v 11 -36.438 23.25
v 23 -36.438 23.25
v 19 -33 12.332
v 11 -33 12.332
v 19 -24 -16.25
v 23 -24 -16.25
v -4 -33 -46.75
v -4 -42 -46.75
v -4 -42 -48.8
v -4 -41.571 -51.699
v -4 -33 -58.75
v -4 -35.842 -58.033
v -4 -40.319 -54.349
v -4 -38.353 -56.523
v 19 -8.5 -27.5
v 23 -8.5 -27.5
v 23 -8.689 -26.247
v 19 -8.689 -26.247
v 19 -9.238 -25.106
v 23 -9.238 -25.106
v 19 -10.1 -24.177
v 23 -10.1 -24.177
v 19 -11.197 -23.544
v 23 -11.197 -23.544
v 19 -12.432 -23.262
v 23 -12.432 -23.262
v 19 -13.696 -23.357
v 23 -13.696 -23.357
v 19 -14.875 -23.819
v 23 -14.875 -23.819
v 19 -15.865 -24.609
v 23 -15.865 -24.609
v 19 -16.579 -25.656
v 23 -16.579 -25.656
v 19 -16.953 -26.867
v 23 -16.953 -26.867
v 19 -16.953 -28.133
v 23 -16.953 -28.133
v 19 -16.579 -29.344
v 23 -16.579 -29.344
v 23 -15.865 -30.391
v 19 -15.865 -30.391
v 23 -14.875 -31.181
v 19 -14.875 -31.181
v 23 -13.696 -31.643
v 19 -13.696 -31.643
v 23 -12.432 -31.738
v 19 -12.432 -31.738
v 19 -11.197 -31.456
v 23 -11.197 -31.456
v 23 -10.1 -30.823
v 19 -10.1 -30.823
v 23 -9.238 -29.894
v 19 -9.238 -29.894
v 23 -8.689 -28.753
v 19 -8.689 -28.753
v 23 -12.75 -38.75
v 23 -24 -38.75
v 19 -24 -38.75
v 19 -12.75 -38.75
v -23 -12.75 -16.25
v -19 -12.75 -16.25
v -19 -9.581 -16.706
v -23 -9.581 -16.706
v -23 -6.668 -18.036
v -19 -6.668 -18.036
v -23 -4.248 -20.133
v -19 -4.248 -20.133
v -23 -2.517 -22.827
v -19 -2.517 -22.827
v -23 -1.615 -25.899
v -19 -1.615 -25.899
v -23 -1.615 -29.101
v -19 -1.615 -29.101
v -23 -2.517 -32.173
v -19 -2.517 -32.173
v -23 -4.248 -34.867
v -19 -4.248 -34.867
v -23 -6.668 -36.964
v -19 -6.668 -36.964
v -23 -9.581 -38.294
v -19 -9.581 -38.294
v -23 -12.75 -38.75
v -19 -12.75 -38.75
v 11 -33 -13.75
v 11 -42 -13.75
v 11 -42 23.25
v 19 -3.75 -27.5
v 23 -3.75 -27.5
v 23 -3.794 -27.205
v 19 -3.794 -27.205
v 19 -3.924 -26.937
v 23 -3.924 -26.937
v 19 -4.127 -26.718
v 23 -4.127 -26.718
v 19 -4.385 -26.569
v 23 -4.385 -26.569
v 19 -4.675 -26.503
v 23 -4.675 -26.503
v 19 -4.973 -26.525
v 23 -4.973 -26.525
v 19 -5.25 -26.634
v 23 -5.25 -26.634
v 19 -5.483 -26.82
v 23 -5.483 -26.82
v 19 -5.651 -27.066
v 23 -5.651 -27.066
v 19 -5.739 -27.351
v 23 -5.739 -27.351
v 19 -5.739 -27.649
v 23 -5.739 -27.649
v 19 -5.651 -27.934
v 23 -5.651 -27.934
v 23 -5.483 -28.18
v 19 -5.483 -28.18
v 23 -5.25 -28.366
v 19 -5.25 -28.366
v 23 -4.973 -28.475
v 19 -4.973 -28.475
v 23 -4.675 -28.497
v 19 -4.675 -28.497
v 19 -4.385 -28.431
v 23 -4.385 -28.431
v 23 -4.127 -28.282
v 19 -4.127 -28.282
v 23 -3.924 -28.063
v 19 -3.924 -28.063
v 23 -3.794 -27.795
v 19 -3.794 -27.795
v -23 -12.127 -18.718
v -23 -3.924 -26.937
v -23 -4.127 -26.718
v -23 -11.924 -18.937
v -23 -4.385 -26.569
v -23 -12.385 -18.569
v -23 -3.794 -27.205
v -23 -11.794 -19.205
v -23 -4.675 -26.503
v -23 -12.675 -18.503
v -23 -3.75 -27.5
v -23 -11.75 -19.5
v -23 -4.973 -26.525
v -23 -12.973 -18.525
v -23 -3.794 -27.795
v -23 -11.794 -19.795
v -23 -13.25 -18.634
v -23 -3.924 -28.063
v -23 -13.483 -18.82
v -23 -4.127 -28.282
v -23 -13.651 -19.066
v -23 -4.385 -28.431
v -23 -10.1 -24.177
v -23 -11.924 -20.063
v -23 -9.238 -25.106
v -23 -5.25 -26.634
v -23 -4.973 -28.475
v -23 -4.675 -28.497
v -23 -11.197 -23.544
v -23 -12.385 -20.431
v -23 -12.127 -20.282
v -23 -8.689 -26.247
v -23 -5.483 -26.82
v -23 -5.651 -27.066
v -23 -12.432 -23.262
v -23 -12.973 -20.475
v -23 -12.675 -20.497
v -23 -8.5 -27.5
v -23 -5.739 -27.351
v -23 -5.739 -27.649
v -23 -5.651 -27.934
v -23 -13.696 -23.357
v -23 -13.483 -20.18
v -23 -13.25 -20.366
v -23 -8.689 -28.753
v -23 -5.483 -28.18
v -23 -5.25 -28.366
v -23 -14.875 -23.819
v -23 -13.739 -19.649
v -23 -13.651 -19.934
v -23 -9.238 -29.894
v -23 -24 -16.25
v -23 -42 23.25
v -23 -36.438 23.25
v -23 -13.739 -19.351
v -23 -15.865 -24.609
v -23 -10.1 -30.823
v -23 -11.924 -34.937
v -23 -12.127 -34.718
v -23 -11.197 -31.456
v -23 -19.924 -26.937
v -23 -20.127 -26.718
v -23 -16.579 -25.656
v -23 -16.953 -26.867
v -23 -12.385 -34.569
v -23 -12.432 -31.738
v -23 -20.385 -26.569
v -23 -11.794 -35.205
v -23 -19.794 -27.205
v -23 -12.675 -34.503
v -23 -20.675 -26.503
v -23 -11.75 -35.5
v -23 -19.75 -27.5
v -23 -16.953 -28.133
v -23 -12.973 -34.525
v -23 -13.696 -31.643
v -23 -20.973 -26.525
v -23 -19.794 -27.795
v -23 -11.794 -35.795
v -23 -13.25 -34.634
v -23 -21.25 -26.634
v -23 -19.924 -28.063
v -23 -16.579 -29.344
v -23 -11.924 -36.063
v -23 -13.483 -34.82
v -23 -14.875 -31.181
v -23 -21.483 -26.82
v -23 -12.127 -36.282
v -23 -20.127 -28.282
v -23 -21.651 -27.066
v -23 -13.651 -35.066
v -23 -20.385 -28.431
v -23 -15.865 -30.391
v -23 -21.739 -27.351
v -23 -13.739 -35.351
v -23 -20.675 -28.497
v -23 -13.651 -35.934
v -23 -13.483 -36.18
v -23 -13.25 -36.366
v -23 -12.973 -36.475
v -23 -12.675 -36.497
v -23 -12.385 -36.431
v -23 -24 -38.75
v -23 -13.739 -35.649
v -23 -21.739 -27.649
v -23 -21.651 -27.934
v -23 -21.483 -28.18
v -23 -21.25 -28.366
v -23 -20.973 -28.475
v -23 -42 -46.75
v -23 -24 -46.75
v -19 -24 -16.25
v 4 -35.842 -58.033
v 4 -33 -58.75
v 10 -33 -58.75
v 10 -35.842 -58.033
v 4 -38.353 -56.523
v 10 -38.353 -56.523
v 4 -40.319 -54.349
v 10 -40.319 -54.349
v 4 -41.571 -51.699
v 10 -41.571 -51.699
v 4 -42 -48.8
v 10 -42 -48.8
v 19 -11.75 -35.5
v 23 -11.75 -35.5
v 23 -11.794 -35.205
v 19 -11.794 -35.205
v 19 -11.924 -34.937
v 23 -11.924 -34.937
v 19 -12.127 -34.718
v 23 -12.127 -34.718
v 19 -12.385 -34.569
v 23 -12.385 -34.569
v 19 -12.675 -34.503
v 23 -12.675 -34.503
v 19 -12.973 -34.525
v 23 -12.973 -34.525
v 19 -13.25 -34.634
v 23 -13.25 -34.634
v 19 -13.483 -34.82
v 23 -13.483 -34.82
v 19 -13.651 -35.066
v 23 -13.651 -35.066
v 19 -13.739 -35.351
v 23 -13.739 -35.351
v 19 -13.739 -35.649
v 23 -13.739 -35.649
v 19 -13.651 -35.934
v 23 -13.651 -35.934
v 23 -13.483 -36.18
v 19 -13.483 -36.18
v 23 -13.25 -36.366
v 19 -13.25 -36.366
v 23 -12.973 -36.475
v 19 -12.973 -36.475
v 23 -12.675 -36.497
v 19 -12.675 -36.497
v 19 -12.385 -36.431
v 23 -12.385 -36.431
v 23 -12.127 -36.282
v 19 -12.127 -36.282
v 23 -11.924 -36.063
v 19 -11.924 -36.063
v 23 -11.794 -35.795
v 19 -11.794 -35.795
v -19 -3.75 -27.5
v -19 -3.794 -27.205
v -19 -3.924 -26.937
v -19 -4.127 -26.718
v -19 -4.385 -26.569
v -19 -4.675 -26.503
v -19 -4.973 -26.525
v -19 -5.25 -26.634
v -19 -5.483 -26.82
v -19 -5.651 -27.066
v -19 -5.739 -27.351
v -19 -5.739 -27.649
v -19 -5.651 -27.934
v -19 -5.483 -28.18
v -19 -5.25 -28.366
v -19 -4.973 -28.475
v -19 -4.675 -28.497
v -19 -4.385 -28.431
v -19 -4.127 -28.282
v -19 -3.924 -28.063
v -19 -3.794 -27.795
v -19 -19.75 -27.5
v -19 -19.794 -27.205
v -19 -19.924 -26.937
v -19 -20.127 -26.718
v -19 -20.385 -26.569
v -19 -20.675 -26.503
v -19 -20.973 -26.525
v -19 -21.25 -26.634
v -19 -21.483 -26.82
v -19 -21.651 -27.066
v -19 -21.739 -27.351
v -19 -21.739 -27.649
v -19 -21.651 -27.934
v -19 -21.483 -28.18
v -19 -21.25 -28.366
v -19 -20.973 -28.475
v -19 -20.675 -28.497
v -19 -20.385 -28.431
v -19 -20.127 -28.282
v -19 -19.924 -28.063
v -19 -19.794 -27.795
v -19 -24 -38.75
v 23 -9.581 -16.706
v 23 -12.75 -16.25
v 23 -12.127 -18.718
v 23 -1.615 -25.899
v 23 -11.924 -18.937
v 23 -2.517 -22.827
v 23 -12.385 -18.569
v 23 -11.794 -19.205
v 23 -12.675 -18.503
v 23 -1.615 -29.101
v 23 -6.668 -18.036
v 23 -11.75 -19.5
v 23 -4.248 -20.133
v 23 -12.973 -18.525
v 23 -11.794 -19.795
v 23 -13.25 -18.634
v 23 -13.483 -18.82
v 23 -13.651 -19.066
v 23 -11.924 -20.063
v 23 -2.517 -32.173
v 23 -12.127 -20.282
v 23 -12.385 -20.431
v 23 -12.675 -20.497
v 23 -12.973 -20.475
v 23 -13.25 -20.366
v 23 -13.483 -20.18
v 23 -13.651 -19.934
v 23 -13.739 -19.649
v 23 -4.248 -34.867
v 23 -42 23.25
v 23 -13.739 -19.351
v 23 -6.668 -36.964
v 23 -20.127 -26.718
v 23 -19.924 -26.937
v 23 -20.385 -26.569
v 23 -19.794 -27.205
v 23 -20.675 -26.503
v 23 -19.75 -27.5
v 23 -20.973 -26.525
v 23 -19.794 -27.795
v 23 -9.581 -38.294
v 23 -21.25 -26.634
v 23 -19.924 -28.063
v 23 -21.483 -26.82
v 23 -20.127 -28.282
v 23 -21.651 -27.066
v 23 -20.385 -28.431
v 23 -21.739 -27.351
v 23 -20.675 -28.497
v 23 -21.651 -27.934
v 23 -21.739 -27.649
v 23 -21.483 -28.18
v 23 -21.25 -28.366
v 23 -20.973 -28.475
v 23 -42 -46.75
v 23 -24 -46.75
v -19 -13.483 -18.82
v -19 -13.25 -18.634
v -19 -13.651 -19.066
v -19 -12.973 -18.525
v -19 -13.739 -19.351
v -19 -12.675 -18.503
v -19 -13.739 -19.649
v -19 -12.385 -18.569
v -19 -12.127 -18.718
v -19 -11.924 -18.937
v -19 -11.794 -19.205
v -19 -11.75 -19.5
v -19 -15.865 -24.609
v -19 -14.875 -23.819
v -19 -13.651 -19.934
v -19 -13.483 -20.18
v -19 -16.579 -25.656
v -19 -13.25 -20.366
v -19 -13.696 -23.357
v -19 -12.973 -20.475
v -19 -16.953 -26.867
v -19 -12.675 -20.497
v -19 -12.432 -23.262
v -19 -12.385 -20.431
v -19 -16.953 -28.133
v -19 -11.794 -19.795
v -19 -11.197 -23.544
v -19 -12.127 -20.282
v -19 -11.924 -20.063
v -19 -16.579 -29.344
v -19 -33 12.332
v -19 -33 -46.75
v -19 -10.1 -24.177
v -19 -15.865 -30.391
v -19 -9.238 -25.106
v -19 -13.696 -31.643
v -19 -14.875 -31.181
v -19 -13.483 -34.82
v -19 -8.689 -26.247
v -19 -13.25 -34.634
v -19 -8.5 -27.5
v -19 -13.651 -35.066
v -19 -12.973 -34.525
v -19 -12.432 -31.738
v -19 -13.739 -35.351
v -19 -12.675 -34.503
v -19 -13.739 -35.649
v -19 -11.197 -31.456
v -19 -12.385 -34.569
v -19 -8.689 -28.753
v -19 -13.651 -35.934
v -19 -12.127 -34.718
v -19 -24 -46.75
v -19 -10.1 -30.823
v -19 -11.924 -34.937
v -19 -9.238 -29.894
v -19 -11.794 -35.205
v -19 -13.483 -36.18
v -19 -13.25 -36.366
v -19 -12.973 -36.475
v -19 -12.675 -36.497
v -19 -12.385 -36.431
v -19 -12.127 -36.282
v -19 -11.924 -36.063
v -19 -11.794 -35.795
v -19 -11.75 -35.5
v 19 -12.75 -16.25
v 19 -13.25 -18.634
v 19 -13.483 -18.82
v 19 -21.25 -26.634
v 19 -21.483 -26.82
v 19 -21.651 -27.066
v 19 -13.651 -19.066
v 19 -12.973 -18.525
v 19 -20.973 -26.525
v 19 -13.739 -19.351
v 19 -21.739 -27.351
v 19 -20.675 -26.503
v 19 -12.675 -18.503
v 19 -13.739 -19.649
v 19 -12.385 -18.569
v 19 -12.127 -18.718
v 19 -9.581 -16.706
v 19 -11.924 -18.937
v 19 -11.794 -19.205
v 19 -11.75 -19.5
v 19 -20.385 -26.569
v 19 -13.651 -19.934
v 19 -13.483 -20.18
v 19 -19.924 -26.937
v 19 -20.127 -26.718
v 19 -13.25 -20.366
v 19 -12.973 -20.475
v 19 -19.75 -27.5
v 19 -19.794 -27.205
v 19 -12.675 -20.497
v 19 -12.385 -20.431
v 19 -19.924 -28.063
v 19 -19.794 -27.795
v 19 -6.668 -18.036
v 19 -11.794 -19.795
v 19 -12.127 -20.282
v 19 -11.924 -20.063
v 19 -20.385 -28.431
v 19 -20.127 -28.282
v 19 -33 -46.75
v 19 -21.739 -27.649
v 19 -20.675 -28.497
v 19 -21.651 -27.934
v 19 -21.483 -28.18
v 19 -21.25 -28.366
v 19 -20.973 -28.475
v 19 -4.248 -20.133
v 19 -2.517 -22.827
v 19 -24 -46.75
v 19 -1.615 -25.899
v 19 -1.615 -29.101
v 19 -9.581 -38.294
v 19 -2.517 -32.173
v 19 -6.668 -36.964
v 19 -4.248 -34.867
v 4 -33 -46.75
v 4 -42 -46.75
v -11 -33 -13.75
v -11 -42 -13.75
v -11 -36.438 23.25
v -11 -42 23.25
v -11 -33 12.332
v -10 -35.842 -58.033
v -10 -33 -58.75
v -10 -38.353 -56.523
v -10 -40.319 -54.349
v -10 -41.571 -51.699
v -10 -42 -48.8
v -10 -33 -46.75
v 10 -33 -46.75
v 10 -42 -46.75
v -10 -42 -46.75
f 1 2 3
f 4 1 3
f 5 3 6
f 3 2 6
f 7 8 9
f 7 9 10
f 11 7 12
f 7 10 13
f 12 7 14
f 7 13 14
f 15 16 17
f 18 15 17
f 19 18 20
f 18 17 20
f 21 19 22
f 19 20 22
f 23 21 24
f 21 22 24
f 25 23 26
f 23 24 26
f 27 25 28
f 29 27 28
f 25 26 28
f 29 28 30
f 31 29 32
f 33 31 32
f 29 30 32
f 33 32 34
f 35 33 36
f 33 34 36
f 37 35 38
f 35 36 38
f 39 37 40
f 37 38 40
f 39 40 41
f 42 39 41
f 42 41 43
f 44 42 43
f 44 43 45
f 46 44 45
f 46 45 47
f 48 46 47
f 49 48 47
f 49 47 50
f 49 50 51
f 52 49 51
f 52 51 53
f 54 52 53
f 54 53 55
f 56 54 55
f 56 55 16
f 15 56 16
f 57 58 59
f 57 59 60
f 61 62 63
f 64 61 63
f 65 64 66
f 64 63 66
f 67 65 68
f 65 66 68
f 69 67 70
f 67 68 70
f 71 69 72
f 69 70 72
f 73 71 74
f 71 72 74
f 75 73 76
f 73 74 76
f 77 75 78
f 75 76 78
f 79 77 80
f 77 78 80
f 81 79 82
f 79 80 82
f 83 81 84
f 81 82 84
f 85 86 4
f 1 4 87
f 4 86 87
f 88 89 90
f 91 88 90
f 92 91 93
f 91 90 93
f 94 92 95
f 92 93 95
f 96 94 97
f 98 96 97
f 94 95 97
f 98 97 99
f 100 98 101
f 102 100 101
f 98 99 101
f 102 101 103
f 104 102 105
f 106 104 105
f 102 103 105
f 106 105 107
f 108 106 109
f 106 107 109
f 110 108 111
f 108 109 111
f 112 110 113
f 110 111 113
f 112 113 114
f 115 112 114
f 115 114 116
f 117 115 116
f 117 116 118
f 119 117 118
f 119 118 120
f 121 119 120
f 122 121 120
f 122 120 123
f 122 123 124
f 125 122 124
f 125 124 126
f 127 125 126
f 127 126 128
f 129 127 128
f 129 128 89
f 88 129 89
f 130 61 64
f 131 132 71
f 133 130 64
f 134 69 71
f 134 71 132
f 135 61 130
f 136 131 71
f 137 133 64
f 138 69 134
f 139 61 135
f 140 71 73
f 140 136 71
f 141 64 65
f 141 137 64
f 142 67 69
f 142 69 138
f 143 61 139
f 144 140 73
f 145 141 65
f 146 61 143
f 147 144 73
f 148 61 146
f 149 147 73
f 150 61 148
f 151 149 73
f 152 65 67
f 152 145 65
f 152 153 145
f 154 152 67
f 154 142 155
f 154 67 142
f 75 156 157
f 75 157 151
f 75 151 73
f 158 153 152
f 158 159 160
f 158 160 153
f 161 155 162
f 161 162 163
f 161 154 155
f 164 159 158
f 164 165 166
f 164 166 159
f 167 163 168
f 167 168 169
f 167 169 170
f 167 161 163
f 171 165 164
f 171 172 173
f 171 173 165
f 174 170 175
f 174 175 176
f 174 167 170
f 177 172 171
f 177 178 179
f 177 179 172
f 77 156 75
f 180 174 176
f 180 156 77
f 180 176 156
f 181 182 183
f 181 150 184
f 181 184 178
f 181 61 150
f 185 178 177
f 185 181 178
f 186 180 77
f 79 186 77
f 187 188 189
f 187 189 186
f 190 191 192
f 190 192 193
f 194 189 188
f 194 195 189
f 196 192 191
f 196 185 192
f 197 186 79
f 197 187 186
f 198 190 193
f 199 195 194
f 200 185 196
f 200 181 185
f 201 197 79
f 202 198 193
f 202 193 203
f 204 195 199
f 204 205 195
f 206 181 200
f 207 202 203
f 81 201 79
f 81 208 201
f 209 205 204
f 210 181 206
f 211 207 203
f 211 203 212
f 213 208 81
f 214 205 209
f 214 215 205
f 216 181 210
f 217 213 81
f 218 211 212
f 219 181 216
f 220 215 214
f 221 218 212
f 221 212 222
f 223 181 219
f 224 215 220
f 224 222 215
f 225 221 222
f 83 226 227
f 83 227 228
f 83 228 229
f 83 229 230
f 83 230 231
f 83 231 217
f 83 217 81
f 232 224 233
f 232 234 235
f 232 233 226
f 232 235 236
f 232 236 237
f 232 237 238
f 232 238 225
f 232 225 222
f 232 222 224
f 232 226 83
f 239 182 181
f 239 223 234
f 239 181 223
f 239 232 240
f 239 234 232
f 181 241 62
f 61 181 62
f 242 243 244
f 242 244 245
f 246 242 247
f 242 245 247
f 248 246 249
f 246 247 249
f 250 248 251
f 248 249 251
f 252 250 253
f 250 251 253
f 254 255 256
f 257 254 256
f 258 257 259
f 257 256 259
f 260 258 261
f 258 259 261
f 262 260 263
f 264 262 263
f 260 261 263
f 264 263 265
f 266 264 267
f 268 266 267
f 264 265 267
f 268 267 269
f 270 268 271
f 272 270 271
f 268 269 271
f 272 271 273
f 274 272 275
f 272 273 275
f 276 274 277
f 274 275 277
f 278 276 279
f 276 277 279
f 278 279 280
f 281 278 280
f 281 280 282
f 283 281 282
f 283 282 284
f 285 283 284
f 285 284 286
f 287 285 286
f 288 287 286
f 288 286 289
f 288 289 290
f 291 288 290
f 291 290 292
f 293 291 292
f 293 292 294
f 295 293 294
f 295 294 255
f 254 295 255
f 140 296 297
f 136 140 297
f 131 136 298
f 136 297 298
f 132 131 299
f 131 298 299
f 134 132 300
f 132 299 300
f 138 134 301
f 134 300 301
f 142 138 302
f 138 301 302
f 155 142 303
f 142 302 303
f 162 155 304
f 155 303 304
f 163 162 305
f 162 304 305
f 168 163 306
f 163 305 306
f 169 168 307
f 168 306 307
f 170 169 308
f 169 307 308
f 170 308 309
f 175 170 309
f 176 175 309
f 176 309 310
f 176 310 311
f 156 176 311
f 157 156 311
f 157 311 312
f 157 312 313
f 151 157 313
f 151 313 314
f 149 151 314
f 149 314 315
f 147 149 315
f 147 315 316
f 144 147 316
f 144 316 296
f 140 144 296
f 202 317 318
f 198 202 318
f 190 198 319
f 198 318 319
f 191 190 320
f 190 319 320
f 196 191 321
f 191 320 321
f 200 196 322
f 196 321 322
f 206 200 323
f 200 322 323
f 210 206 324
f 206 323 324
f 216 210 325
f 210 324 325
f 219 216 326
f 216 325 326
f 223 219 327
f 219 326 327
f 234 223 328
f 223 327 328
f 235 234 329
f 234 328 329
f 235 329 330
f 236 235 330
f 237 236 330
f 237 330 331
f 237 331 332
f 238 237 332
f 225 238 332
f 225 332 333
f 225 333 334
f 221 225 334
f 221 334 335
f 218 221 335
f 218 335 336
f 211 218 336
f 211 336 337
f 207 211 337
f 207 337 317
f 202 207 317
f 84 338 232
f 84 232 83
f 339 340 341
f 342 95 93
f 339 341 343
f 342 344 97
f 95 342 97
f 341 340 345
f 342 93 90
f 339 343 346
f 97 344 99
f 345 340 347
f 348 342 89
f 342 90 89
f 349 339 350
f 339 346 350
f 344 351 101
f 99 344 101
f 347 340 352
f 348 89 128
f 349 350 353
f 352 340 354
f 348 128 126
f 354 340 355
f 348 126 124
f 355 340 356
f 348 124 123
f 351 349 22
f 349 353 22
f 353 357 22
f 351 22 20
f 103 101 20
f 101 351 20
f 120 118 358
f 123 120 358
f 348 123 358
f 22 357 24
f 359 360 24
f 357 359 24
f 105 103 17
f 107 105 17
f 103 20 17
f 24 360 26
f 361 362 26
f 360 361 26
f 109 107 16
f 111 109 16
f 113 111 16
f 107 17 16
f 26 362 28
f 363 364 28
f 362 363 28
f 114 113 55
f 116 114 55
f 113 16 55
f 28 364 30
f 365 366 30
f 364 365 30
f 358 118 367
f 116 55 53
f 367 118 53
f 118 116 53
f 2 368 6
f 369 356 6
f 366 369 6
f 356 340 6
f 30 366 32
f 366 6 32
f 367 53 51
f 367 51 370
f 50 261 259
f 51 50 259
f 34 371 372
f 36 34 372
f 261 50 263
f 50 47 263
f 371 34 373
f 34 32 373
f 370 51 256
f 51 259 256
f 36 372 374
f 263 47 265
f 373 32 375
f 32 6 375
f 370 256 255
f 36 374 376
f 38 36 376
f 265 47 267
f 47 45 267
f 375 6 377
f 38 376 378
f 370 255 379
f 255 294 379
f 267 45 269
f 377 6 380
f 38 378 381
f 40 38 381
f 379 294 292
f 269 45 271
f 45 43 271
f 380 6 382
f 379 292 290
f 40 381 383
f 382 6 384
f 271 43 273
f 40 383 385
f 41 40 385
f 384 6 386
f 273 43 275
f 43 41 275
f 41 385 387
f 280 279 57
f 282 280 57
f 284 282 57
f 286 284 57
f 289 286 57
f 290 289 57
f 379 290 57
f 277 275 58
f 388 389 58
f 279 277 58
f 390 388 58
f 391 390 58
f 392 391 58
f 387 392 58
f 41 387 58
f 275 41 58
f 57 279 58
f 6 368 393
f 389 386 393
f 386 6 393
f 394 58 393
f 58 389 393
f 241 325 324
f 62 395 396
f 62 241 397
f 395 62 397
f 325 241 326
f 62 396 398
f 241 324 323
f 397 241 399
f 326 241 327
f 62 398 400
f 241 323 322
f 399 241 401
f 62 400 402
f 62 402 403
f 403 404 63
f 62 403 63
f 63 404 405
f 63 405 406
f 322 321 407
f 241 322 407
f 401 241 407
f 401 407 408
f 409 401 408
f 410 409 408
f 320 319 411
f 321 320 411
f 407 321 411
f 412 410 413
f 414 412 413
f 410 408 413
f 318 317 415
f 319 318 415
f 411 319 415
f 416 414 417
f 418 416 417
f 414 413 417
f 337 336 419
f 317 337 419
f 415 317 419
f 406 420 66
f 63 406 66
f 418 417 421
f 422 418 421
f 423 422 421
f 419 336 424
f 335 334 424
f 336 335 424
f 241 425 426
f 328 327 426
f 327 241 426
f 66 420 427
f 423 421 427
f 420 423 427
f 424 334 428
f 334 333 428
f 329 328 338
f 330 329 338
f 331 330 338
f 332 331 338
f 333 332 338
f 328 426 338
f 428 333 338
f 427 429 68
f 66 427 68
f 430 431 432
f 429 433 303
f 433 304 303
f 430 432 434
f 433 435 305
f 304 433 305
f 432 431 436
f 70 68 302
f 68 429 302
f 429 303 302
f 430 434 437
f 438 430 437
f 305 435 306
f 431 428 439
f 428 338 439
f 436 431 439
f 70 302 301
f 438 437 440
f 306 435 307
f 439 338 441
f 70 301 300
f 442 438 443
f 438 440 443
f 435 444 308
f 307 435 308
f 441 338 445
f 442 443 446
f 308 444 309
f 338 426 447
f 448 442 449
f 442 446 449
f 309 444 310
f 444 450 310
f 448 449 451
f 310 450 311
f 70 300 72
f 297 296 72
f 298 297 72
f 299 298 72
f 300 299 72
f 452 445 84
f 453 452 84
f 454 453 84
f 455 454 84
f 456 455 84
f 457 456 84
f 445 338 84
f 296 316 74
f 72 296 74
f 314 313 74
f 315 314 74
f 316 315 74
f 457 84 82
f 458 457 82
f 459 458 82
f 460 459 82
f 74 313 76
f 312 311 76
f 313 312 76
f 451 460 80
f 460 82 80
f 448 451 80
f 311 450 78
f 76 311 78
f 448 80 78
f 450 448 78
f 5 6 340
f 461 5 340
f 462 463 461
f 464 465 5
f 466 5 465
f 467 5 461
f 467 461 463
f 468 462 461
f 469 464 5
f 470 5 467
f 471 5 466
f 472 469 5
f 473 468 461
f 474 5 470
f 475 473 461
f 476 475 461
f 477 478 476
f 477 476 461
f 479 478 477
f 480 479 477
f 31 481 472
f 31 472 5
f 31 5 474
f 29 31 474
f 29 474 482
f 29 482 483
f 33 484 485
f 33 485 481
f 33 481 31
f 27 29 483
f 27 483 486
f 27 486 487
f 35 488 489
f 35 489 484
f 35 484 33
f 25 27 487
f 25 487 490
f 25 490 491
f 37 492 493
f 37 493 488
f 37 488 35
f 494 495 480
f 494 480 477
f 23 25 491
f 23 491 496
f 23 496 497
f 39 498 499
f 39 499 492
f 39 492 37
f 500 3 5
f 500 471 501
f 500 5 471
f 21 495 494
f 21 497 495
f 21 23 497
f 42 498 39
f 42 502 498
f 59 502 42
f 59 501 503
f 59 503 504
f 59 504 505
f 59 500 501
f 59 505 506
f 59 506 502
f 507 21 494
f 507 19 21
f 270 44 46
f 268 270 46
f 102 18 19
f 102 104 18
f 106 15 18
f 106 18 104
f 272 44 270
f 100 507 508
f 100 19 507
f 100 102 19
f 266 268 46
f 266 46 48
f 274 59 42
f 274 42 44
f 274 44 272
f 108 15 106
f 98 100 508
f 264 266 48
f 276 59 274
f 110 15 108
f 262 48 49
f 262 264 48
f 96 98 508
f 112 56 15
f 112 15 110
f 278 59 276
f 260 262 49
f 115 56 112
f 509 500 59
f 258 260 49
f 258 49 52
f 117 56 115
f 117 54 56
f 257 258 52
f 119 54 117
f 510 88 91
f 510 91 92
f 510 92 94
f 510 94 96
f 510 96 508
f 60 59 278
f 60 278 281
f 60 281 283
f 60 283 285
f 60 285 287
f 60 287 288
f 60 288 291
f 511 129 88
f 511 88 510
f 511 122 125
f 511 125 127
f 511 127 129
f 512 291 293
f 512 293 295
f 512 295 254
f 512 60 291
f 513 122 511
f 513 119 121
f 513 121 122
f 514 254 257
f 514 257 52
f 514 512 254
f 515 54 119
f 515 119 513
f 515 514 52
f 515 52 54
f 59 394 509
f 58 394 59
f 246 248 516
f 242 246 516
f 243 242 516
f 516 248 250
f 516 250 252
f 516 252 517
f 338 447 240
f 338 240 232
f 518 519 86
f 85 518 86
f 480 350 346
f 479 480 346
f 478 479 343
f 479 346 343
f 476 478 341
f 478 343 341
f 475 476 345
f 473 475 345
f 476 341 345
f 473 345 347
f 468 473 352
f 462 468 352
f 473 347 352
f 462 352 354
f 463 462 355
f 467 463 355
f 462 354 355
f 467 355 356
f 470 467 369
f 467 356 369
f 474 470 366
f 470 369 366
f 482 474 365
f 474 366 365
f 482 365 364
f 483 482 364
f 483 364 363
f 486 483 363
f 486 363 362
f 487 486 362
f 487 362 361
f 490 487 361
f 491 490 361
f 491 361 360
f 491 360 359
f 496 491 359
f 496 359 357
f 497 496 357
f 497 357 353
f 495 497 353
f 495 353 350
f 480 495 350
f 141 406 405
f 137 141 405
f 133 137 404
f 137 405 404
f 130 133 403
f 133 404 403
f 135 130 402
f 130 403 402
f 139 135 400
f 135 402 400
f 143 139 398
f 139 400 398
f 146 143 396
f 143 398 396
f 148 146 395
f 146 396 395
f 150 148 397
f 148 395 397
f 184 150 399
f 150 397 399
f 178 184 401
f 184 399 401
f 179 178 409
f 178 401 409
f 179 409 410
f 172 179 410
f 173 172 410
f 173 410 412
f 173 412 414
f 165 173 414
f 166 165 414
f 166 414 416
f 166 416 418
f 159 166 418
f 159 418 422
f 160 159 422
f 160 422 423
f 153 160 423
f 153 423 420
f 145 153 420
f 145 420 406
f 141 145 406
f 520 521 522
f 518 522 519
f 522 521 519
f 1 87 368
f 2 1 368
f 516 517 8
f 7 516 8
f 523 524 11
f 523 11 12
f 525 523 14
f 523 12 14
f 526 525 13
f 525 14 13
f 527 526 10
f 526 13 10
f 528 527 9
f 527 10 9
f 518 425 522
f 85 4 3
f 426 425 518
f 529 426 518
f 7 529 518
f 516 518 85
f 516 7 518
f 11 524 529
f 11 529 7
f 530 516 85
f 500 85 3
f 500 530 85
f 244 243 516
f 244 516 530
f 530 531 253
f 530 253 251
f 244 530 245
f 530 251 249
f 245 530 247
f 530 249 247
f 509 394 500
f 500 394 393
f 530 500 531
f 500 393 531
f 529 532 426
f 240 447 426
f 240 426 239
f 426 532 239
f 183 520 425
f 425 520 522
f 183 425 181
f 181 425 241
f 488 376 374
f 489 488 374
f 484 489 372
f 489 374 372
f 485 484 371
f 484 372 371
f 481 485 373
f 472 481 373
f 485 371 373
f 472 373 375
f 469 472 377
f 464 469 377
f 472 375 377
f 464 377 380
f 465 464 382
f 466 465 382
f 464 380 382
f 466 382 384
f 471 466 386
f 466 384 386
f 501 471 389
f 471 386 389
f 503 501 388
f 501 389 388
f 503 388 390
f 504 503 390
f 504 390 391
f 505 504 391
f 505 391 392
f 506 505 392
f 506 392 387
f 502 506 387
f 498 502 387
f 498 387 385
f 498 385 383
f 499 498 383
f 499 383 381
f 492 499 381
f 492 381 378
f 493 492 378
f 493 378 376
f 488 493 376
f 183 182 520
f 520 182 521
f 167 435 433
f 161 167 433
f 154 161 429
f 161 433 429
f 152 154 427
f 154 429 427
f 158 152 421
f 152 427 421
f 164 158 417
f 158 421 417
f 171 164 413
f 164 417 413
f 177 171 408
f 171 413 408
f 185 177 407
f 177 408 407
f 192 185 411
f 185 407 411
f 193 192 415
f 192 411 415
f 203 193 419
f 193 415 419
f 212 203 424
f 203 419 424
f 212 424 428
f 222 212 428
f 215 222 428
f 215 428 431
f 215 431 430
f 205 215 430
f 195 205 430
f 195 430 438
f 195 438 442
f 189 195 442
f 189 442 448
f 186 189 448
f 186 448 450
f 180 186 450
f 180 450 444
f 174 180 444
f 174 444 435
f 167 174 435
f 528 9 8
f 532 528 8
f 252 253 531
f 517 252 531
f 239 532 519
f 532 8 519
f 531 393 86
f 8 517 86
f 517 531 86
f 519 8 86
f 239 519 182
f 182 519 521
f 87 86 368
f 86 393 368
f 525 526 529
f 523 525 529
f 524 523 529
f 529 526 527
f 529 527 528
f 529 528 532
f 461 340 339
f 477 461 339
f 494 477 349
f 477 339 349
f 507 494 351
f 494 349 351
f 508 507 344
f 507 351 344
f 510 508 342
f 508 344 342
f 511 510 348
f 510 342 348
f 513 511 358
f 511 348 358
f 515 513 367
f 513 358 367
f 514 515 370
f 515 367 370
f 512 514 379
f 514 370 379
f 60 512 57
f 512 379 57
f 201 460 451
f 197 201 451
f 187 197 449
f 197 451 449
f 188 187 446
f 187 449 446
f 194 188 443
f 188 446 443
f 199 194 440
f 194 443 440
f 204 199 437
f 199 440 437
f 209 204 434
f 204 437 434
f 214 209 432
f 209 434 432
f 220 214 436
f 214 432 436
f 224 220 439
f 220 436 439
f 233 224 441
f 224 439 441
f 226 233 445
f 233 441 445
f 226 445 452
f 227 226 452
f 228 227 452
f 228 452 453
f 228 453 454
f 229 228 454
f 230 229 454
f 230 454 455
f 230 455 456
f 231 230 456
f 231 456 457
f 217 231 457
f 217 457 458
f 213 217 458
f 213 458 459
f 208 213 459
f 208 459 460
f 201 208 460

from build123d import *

# Parameters (mm, degrees)
SKETCH1_W                = 50
SKETCH1_H                = 170
BOSS_EXTRUDE1_DEPTH      = 55
SKETCH2_W                = 34
SKETCH2_H                = 27
CUT_EXTRUDE1_DEPTH       = 181.416185527
SKETCH3_W                = 10
SKETCH3_H                = 24
SKETCH3_R                = 4.25
SKETCH3_R_2              = 1
CUT_EXTRUDE2_DEPTH       = 186.539753153
SKETCH4_W                = 2
SKETCH4_H                = 24
CUT_EXTRUDE3_DEPTH       = 178.623196683
SKETCH5_W                = 6.25
SKETCH5_H                = 11.25
CUT_EXTRUDE4_DEPTH       = 186.539753153
SKETCH6_W                = 38
SKETCH6_H                = 10
CUT_EXTRUDE5_DEPTH       = 181.416185527
SKETCH8_W                = 13.25
SKETCH8_H                = 2.25
CUT_EXTRUDE7_DEPTH       = 186.539753153
SKETCH9_W                = 34
SKETCH9_H                = 35.25
CUT_EXTRUDE8_DEPTH       = 179.297679458
SKETCH11_W               = 13.25
SKETCH11_H               = 20.25
CUT_EXTRUDE9_DEPTH       = 184.480414486
SKETCH12_W               = 28.5
SKETCH12_H               = 15
BOSS_EXTRUDE2_DEPTH      = 8
SKETCH14_W               = 34
SKETCH14_H               = 15
SKETCH14_H_2             = 10.25
BOSS_EXTRUDE3_DEPTH      = 13.25
SKETCH16_R               = 4.5
SKETCH16_R_2             = 2.5
CUT_EXTRUDE13_DEPTH      = 8
SKETCH17_R               = 4.5
SKETCH17_W               = 55
SKETCH17_H               = 10.25
CUT_EXTRUDE15_DEPTH      = 175.384811552
SKETCH18_W               = 71.25
SKETCH18_H               = 27.5
SKETCH18_W_2             = 13.75
SKETCH18_W_3             = 16.25
BOSS_EXTRUDE4_DEPTH      = 50
SKETCH19_W               = 38
SKETCH19_H               = 7
CUT_EXTRUDE16_DEPTH      = 152.25227271
SKETCH20_W               = 57.5
SKETCH20_H               = 27.5
CUT_EXTRUDE17_DEPTH      = 102.137591923
CUT_EXTRUDE18_DEPTH      = 100.39221549
SKETCH22_W               = 82.5
SKETCH22_H               = 2.5
BOSS_EXTRUDE5_DEPTH      = 50
SKETCH24_W               = 22
SKETCH24_H               = 17
CUT_EXTRUDE19_DEPTH      = 101.710289941
SKETCH25_W               = 38
SKETCH25_H               = 38.136363636
CUT_EXTRUDE20_DEPTH      = 10
SKETCH27_W               = 38
SKETCH27_H               = 60.136363636
BOSS_EXTRUDE6_DEPTH      = 8.6
SKETCH29_W               = 38
SKETCH29_H               = 1.4
CUT_EXTRUDE21_DEPTH      = 85.601313414
BOSS_EXTRUDE7_DEPTH      = 50
SKETCH31_W               = 38
SKETCH31_H               = 17
CUT_EXTRUDE22_DEPTH      = 117.365802537
SKETCH32_W               = 100
SKETCH32_H               = 3
CUT_EXTRUDE23_DEPTH      = 101.710289941
SKETCH33_W               = 20
SKETCH33_H               = 10
SKETCH33_W_2             = 22
SKETCH33_H_2             = 45
CUT_EXTRUDE24_DEPTH      = 84.137311118
SKETCH34_W               = 8
SKETCH34_H               = 12
CUT_EXTRUDE25_DEPTH      = 76.0787087
BOSS_EXTRUDE8_DEPTH      = 8
SKETCH37_W               = 78
SKETCH37_H               = 9
SKETCH37_W_2             = 12
CUT_EXTRUDE27_DEPTH      = 93.48006542
FILLET1_R                = 10
CUT_EXTRUDE29_DEPTH      = 77.423572934
CUT_EXTRUDE29_DEPTH_BACK = 77.423572934
SKETCH38_W               = 2
SKETCH38_H               = 78
SKETCH38_W_2             = 46
SKETCH38_H_2             = 8


with BuildPart() as part:
    # Sketch1 → Boss-Extrude1 (new body)
    with BuildSketch(Plane.XY):
        with Locations((0, -85)):
            Rectangle(SKETCH1_W, SKETCH1_H)
    extrude(amount=-BOSS_EXTRUDE1_DEPTH)

    # Sketch2 → Cut-Extrude1 (cut, through all)
    with BuildSketch(Plane.XY):
        with Locations((0, -13.5)):
            Rectangle(SKETCH2_W, SKETCH2_H)
    extrude(amount=-CUT_EXTRUDE1_DEPTH, mode=Mode.SUBTRACT)

    # Sketch3 → Cut-Extrude2 (cut, through all)
    with BuildSketch(Plane(origin=(25, 0, 0), x_dir=(0, 0, -1), z_dir=(1, 0, 0))):
        with Locations((50, -12)):
            Rectangle(SKETCH3_W, SKETCH3_H)
        with Locations((5, -12)):
            Rectangle(SKETCH3_W, SKETCH3_H)
        with Locations(Location((27.5, -12.75, 0), (0, 0, 90))):
            Circle(SKETCH3_R)
        with Locations(Location((35.5, -12.75, 0), (0, 0, 90))):
            Circle(SKETCH3_R_2)
        with Locations(Location((27.5, -4.75, 0), (0, 0, 90))):
            Circle(SKETCH3_R_2)
        with Locations(Location((27.5, -20.75, 0), (0, 0, 90))):
            Circle(SKETCH3_R_2)
        with Locations(Location((19.5, -12.75, 0), (0, 0, 90))):
            Circle(SKETCH3_R_2)
    extrude(amount=-CUT_EXTRUDE2_DEPTH, mode=Mode.SUBTRACT)

    # Sketch4 → Cut-Extrude3 (cut, through all)
    with BuildSketch(Plane.XY.offset(-10)):
        with Locations((-18, -12)):
            Rectangle(SKETCH4_W, SKETCH4_H)
        with Locations((18, -12)):
            Rectangle(SKETCH4_W, SKETCH4_H)
    extrude(amount=-CUT_EXTRUDE3_DEPTH, mode=Mode.SUBTRACT)

    # Sketch5 → Cut-Extrude4 (cut, through all)
    with BuildSketch(Plane(origin=(25, 0, 0), x_dir=(0, 0, -1), z_dir=(1, 0, 0))):
        with BuildLine():
            Line((45, 0), (10, 0))
            Line((10, 0), (10, -12.75))
            Line((10, -12.75), (16.25, -12.75))
            ThreePointArc((16.25, -12.75), (27.5, -1.5), (38.75, -12.75))
            Line((38.75, -12.75), (45, -12.75))
            Line((45, -12.75), (45, 0))
        make_face()
        with Locations((13.125, -18.375)):
            Rectangle(SKETCH5_W, SKETCH5_H)
        with Locations((41.875, -18.375)):
            Rectangle(SKETCH5_W, SKETCH5_H)
    extrude(amount=-CUT_EXTRUDE4_DEPTH, mode=Mode.SUBTRACT)

    # Sketch6 → Cut-Extrude5 (cut, through all)
    with BuildSketch(Plane.XY):
        with Locations((0, -29)):
            Rectangle(SKETCH6_W, SKETCH6_H)
    extrude(amount=-CUT_EXTRUDE5_DEPTH, mode=Mode.SUBTRACT)

    # Sketch8 → Cut-Extrude7 (cut, through all)
    with BuildSketch(Plane(origin=(25, 0, 0), x_dir=(0, 0, -1), z_dir=(1, 0, 0))):
        with BuildLine():
            Line((27.5, -157.5), (27.5, -132.5))
            Line((27.5, -132.5), (13.25, -132.5))
            Line((13.25, -132.5), (13.25, -167.75))
            Line((13.25, -167.75), (17.25, -167.75))
            ThreePointArc((17.25, -167.75), (20.252155493, -160.502155493), (27.5, -157.5))
        make_face()
        with BuildLine():
            Line((41.75, -167.75), (41.75, -132.5))
            Line((41.75, -132.5), (27.5, -132.5))
            Line((27.5, -132.5), (27.5, -157.5))
            ThreePointArc((27.5, -157.5), (34.747844507, -160.502155493), (37.75, -167.75))
            Line((37.75, -167.75), (41.75, -167.75))
        make_face()
        with Locations((48.375, -168.875)):
            Rectangle(SKETCH8_W, SKETCH8_H)
        with Locations((6.625, -168.875)):
            Rectangle(SKETCH8_W, SKETCH8_H)
        with BuildLine():
            Line((17.25, -167.75), (13.25, -167.75))
            Line((13.25, -167.75), (13.25, -170))
            Line((13.25, -170), (17.5, -170))
            ThreePointArc((17.5, -170), (17.31269172, -168.881923142), (17.25, -167.75))
        make_face()
        with BuildLine():
            Line((41.75, -170), (41.75, -167.75))
            Line((41.75, -167.75), (37.75, -167.75))
            ThreePointArc((37.75, -167.75), (37.68730828, -168.881923142), (37.5, -170))
            Line((37.5, -170), (41.75, -170))
        make_face()
        with BuildLine():
            Line((27.5, -167.75), (27.5, -157.5))
            ThreePointArc((27.5, -157.5), (20.252155493, -160.502155493), (17.25, -167.75))
            Line((17.25, -167.75), (27.5, -167.75))
        make_face()
        with BuildLine():
            ThreePointArc((37.75, -167.75), (34.747844507, -160.502155493), (27.5, -157.5))
            Line((27.5, -157.5), (27.5, -167.75))
            Line((27.5, -167.75), (37.75, -167.75))
        make_face()
        with BuildLine():
            Line((27.5, -170), (27.5, -167.75))
            Line((27.5, -167.75), (17.25, -167.75))
            ThreePointArc((17.25, -167.75), (17.31269172, -168.881923142), (17.5, -170))
            Line((17.5, -170), (27.5, -170))
        make_face()
        with BuildLine():
            ThreePointArc((37.5, -170), (37.68730828, -168.881923142), (37.75, -167.75))
            Line((37.75, -167.75), (27.5, -167.75))
            Line((27.5, -167.75), (27.5, -170))
            Line((27.5, -170), (37.5, -170))
        make_face()
    extrude(amount=-CUT_EXTRUDE7_DEPTH, mode=Mode.SUBTRACT)

    # Sketch9 → Cut-Extrude8 (cut, through all)
    with BuildSketch(Plane.XY):
        with Locations((0, -150.125)):
            Rectangle(SKETCH9_W, SKETCH9_H)
    extrude(amount=-CUT_EXTRUDE8_DEPTH, mode=Mode.SUBTRACT)

    # Sketch11 → Cut-Extrude9 (cut, through all)
    with BuildSketch(Plane(origin=(25, 0, 0), x_dir=(0, 0, -1), z_dir=(1, 0, 0))):
        with BuildLine():
            ThreePointArc((17.25, -167.75), (20.252155493, -160.502155493), (27.5, -157.5))
            Line((27.5, -157.5), (27.5, -147.5))
            Line((27.5, -147.5), (13.25, -147.5))
            Line((13.25, -147.5), (13.25, -167.75))
            Line((13.25, -167.75), (17.25, -167.75))
        make_face()
        with BuildLine():
            Line((27.5, -147.5), (27.5, -157.5))
            ThreePointArc((27.5, -157.5), (34.747844507, -160.502155493), (37.75, -167.75))
            Line((37.75, -167.75), (41.75, -167.75))
            Line((41.75, -167.75), (41.75, -147.5))
            Line((41.75, -147.5), (27.5, -147.5))
        make_face()
        with Locations((48.375, -157.625)):
            Rectangle(SKETCH11_W, SKETCH11_H)
        with Locations((6.625, -157.625)):
            Rectangle(SKETCH11_W, SKETCH11_H)
    extrude(amount=-CUT_EXTRUDE9_DEPTH, mode=Mode.SUBTRACT)

    # Sketch12 → Boss-Extrude2 (add)
    with BuildSketch(Plane(origin=(25, 0, 0), x_dir=(0, 0, -1), z_dir=(1, 0, 0))):
        with Locations((27.5, -140)):
            Rectangle(SKETCH12_W, SKETCH12_H)
    boss_extrude2 = extrude(amount=-BOSS_EXTRUDE2_DEPTH)

    # Mirror1: Boss-Extrude2 across plane
    add(boss_extrude2.mirror(Plane(origin=(0, 0, 0), x_dir=(0, 0, 1), z_dir=(1, 0, 0))))

    # Sketch14 → Boss-Extrude3 (add)
    with BuildSketch(Plane.XY):
        with Locations((0, -140)):
            Rectangle(SKETCH14_W, SKETCH14_H)
        with Locations((0, -152.625)):
            Rectangle(SKETCH14_W, SKETCH14_H_2)
    boss_extrude3 = extrude(amount=-BOSS_EXTRUDE3_DEPTH)

    # Mirror2: Boss-Extrude3 across plane
    add(boss_extrude3.mirror(Plane.XY.offset(-27.5)))

    # Sketch16 → Cut-Extrude13 (cut)
    # profile 1 of 3: a face of its own
    with BuildSketch(Plane(origin=(25, 0, 0), x_dir=(0, 0, -1), z_dir=(1, 0, 0))):
        with Locations(Location((16.5, -135.75, 0), (0, 0, 90))):
            Circle(SKETCH16_R)
        with Locations((16.5, -135.75)):
            Circle(SKETCH16_R_2, mode=Mode.SUBTRACT)
    # profile 2 of 3: a face of its own
    with BuildSketch(Plane(origin=(25, 0, 0), x_dir=(0, 0, -1), z_dir=(1, 0, 0))):
        with Locations((16.5, -135.75)):
            Circle(SKETCH16_R_2)
    # profile 3 of 3: a face of its own
    with BuildSketch(Plane(origin=(25, 0, 0), x_dir=(0, 0, -1), z_dir=(1, 0, 0))):
        with Locations(Location((38.5, -135.75, 0), (0, 0, 90))):
            Circle(SKETCH16_R)
    cut_extrude13 = extrude(amount=-CUT_EXTRUDE13_DEPTH, mode=Mode.SUBTRACT)

    # Mirror3: Cut-Extrude13 across plane
    add(cut_extrude13.mirror(Plane(origin=(0, 0, 0), x_dir=(0, 0, 1), z_dir=(1, 0, 0))), mode=Mode.SUBTRACT)

    # Sketch17 → Cut-Extrude15 (cut, through all)
    # profile 1 of 4: a face of its own
    with BuildSketch(Plane(origin=(25, 0, 0), x_dir=(0, 0, -1), z_dir=(1, 0, 0))):
        Polygon((55, -51.5), (27.5, -51.5), (0, -51.5), (0, -147.5), (55, -147.5), align=None)
        with Locations((16.5, -135.75)):
            Circle(SKETCH17_R, mode=Mode.SUBTRACT)
        with Locations((38.5, -135.75)):
            Circle(SKETCH17_R, mode=Mode.SUBTRACT)
    # profile 2 of 4: a face of its own
    with BuildSketch(Plane(origin=(25, 0, 0), x_dir=(0, 0, -1), z_dir=(1, 0, 0))):
        with Locations((27.5, -152.625)):
            Rectangle(SKETCH17_W, SKETCH17_H)
    # profile 3 of 4: a face of its own
    with BuildSketch(Plane(origin=(25, 0, 0), x_dir=(0, 0, -1), z_dir=(1, 0, 0))):
        with Locations((38.5, -135.75)):
            Circle(SKETCH17_R)
    # profile 4 of 4: a face of its own
    with BuildSketch(Plane(origin=(25, 0, 0), x_dir=(0, 0, -1), z_dir=(1, 0, 0))):
        with Locations((16.5, -135.75)):
            Circle(SKETCH17_R)
    extrude(amount=-CUT_EXTRUDE15_DEPTH, mode=Mode.SUBTRACT)

    # Sketch18 → Boss-Extrude4 (add)
    with BuildSketch(Plane(origin=(25, 0, 0), x_dir=(0, 0, -1), z_dir=(1, 0, 0))):
        with Locations((-35.625, -37.75)):
            Rectangle(SKETCH18_W, SKETCH18_H)
        with Locations((61.875, -37.75)):
            Rectangle(SKETCH18_W_2, SKETCH18_H)
        Polygon((38.75, -51.5), (38.75, -24), (16.25, -24), (0, -24), (0, -51.5), align=None)
        with Locations((46.875, -37.75)):
            Rectangle(SKETCH18_W_3, SKETCH18_H)
    extrude(amount=-BOSS_EXTRUDE4_DEPTH)

    # Sketch19 → Cut-Extrude16 (cut, through all)
    with BuildSketch(Plane.XY.offset(71.25)):
        with Locations((0, -27.5)):
            Rectangle(SKETCH19_W, SKETCH19_H)
    extrude(amount=-CUT_EXTRUDE16_DEPTH, mode=Mode.SUBTRACT)

    # Sketch20 → Cut-Extrude17 (cut, through all)
    with BuildSketch(Plane(origin=(25, 0, 0), x_dir=(0, 0, -1), z_dir=(1, 0, 0))):
        with Locations((-42.5, -37.75)):
            Rectangle(SKETCH20_W, SKETCH20_H)
    extrude(amount=-CUT_EXTRUDE17_DEPTH, mode=Mode.SUBTRACT)

    # Sketch21 → Cut-Extrude18 (cut, through all)
    with BuildSketch(Plane(origin=(25, 0, 0), x_dir=(0, 0, -1), z_dir=(1, 0, 0))):
        Polygon((16.25, -24), (-13.75, -51.5), (-13.75, -24), align=None)
    extrude(amount=-CUT_EXTRUDE18_DEPTH, mode=Mode.SUBTRACT)

    # Sketch22 → Boss-Extrude5 (add)
    with BuildSketch(Plane(origin=(25, 0, 0), x_dir=(0, 0, -1), z_dir=(1, 0, 0))):
        with Locations((27.5, -52.75)):
            Rectangle(SKETCH22_W, SKETCH22_H)
    extrude(amount=-BOSS_EXTRUDE5_DEPTH)

    # Sketch24 → Cut-Extrude19 (cut, through all)
    with BuildSketch(Plane(origin=(25, 0, 0), x_dir=(0, 0, -1), z_dir=(1, 0, 0))):
        with Locations((57.75, -32.5)):
            Rectangle(SKETCH24_W, SKETCH24_H)
    extrude(amount=-CUT_EXTRUDE19_DEPTH, mode=Mode.SUBTRACT)

    # Sketch25 → Cut-Extrude20 (cut)
    with BuildSketch(Plane(origin=(0, -31, 0), x_dir=(1, 0, 0), z_dir=(0, 1, 0))):
        with Locations((0, 27.681818182)):
            Rectangle(SKETCH25_W, SKETCH25_H)
    extrude(amount=-CUT_EXTRUDE20_DEPTH, mode=Mode.SUBTRACT)

    # Sketch27 → Boss-Extrude6 (add)
    with BuildSketch(Plane(origin=(0, -41, 0), x_dir=(1, 0, 0), z_dir=(0, 1, 0))):
        with Locations((0, 38.681818182)):
            Rectangle(SKETCH27_W, SKETCH27_H)
    extrude(amount=BOSS_EXTRUDE6_DEPTH)

    # Sketch29 → Cut-Extrude21 (cut, through all)
    with BuildSketch(Plane(origin=(0, 0, -8.613636364), x_dir=(-1, 0, 0), z_dir=(0, 0, -1))):
        with Locations((0, -31.7)):
            Rectangle(SKETCH29_W, SKETCH29_H)
    extrude(amount=-CUT_EXTRUDE21_DEPTH, mode=Mode.SUBTRACT)

    # Sketch30 → Boss-Extrude7 (add)
    with BuildSketch(Plane.ZY.offset(25)):
        Polygon((31.25, -38.957214173), (-16.25, -24), (-7.086363636, -32.4), (13.75, -51.5), (13.75, -53.914428346), (31.25, -53.914428346), align=None)
        Polygon((-16.25, -24), (-16.25, -32.4), (-7.086363636, -32.4), align=None)
    extrude(amount=-BOSS_EXTRUDE7_DEPTH)

    # Sketch31 → Cut-Extrude22 (cut, through all)
    with BuildSketch(Plane(origin=(0, 0, -68.75), x_dir=(-1, 0, 0), z_dir=(0, 0, -1))):
        with Locations((0, -32.5)):
            Rectangle(SKETCH31_W, SKETCH31_H)
    extrude(amount=-CUT_EXTRUDE22_DEPTH, mode=Mode.SUBTRACT)

    # Sketch32 → Cut-Extrude23 (cut, through all)
    with BuildSketch(Plane(origin=(25, 0, 0), x_dir=(0, 0, -1), z_dir=(1, 0, 0))):
        with Locations((18.75, -52.5)):
            Rectangle(SKETCH32_W, SKETCH32_H)
    extrude(amount=-CUT_EXTRUDE23_DEPTH, mode=Mode.SUBTRACT)

    # Sketch33 → Cut-Extrude24 (cut, through all)
    with BuildSketch(Plane(origin=(0, -41, 0), x_dir=(1, 0, 0), z_dir=(0, 1, 0))):
        Polygon((-10, 68.75), (-25, 68.75), (-25, 46.75), (-19, 46.75), (-10, 46.75), (-10, 58.75), align=None)
        Polygon((25, 68.75), (10, 68.75), (10, 58.75), (10, 46.75), (19, 46.75), (25, 46.75), align=None)
        with Locations((0, 63.75)):
            Rectangle(SKETCH33_W, SKETCH33_H)
        with Locations((0, -8.75)):
            Rectangle(SKETCH33_W_2, SKETCH33_H_2)
    extrude(amount=-CUT_EXTRUDE24_DEPTH, mode=Mode.SUBTRACT)

    # Sketch34 → Cut-Extrude25 (cut, through all)
    with BuildSketch(Plane(origin=(0, -41, 0), x_dir=(1, 0, 0), z_dir=(0, 1, 0))):
        with Locations((0, 52.75)):
            Rectangle(SKETCH34_W, SKETCH34_H)
    extrude(amount=-CUT_EXTRUDE25_DEPTH, mode=Mode.SUBTRACT)

    # Sketch36 → Boss-Extrude8 (add)
    with BuildSketch(Plane(origin=(0, -41, 0), x_dir=(1, 0, 0), z_dir=(0, 1, 0))):
        Polygon((4, 58.75), (4, 46.75), (-4, 46.75), (-4, 58.75), (-10, 58.75), (-10, 46.75), (-19, 46.75), (-19, -31.25), (-11, -31.25), (-11, 13.75), (11, 13.75), (11, -31.25), (19, -31.25), (19, 46.75), (10, 46.75), (10, 58.75), align=None)
    extrude(amount=BOSS_EXTRUDE8_DEPTH)

    # Sketch37 → Cut-Extrude27 (cut, through all)
    with BuildSketch(Plane(origin=(25, 0, 0), x_dir=(0, 0, -1), z_dir=(1, 0, 0))):
        with Locations((7.75, -46.5)):
            Rectangle(SKETCH37_W, SKETCH37_H)
        Polygon((-31.25, -33), (-31.25, -38.957214173), (-12.331525614, -33), align=None)
        with Locations((52.75, -46.5)):
            Rectangle(SKETCH37_W_2, SKETCH37_H)
    extrude(amount=-CUT_EXTRUDE27_DEPTH, mode=Mode.SUBTRACT)

    # Fillet1
    # the kernel refuses this fillet: 10 mm, written as the material it takes off along each edge
    with BuildSketch(Plane(origin=(20.874685928, -42, -58.75), x_dir=(0, 0, 1), z_dir=(-1, 0, 0)), Plane(origin=(34.874685928, -42, -58.75), x_dir=(0, 0, 1), z_dir=(-1, 0, 0))) as fillet1_piece_1:
        with BuildLine():
            CenterArc((9.949874371, 10), FILLET1_R, 185.739170477, 84.260829523)
            Line((0, 9), (-0.198997487, 8.98))
            ThreePointArc((-0.198997487, 8.98), (-0.2, 4.5), (-0.2, 0))
            Line((-0.2, 0), (0, -0.2))
            Line((0, -0.2), (9.949874371, -0.2))
            Line((9.949874371, -0.2), (9.949874371, 0))
        make_face()
    extrude(amount=55.749371855, mode=Mode.SUBTRACT)

    # Sketch38 → Cut-Extrude29 (cut, two sides: drawn at the far end of the back side and taken through both)
    with BuildSketch(Plane(origin=(0, 0, 0), x_dir=(1, 0, 0), z_dir=(0, 1, 0)).offset(-CUT_EXTRUDE29_DEPTH_BACK)):
        with Locations((-24, 7.75)):
            Rectangle(SKETCH38_W, SKETCH38_H)
        with Locations((24, 7.75)):
            Rectangle(SKETCH38_W, SKETCH38_H)
        with Locations((0, -27.25)):
            Rectangle(SKETCH38_W_2, SKETCH38_H_2)
    extrude(amount=CUT_EXTRUDE29_DEPTH + CUT_EXTRUDE29_DEPTH_BACK, mode=Mode.SUBTRACT)


solid = part.part
